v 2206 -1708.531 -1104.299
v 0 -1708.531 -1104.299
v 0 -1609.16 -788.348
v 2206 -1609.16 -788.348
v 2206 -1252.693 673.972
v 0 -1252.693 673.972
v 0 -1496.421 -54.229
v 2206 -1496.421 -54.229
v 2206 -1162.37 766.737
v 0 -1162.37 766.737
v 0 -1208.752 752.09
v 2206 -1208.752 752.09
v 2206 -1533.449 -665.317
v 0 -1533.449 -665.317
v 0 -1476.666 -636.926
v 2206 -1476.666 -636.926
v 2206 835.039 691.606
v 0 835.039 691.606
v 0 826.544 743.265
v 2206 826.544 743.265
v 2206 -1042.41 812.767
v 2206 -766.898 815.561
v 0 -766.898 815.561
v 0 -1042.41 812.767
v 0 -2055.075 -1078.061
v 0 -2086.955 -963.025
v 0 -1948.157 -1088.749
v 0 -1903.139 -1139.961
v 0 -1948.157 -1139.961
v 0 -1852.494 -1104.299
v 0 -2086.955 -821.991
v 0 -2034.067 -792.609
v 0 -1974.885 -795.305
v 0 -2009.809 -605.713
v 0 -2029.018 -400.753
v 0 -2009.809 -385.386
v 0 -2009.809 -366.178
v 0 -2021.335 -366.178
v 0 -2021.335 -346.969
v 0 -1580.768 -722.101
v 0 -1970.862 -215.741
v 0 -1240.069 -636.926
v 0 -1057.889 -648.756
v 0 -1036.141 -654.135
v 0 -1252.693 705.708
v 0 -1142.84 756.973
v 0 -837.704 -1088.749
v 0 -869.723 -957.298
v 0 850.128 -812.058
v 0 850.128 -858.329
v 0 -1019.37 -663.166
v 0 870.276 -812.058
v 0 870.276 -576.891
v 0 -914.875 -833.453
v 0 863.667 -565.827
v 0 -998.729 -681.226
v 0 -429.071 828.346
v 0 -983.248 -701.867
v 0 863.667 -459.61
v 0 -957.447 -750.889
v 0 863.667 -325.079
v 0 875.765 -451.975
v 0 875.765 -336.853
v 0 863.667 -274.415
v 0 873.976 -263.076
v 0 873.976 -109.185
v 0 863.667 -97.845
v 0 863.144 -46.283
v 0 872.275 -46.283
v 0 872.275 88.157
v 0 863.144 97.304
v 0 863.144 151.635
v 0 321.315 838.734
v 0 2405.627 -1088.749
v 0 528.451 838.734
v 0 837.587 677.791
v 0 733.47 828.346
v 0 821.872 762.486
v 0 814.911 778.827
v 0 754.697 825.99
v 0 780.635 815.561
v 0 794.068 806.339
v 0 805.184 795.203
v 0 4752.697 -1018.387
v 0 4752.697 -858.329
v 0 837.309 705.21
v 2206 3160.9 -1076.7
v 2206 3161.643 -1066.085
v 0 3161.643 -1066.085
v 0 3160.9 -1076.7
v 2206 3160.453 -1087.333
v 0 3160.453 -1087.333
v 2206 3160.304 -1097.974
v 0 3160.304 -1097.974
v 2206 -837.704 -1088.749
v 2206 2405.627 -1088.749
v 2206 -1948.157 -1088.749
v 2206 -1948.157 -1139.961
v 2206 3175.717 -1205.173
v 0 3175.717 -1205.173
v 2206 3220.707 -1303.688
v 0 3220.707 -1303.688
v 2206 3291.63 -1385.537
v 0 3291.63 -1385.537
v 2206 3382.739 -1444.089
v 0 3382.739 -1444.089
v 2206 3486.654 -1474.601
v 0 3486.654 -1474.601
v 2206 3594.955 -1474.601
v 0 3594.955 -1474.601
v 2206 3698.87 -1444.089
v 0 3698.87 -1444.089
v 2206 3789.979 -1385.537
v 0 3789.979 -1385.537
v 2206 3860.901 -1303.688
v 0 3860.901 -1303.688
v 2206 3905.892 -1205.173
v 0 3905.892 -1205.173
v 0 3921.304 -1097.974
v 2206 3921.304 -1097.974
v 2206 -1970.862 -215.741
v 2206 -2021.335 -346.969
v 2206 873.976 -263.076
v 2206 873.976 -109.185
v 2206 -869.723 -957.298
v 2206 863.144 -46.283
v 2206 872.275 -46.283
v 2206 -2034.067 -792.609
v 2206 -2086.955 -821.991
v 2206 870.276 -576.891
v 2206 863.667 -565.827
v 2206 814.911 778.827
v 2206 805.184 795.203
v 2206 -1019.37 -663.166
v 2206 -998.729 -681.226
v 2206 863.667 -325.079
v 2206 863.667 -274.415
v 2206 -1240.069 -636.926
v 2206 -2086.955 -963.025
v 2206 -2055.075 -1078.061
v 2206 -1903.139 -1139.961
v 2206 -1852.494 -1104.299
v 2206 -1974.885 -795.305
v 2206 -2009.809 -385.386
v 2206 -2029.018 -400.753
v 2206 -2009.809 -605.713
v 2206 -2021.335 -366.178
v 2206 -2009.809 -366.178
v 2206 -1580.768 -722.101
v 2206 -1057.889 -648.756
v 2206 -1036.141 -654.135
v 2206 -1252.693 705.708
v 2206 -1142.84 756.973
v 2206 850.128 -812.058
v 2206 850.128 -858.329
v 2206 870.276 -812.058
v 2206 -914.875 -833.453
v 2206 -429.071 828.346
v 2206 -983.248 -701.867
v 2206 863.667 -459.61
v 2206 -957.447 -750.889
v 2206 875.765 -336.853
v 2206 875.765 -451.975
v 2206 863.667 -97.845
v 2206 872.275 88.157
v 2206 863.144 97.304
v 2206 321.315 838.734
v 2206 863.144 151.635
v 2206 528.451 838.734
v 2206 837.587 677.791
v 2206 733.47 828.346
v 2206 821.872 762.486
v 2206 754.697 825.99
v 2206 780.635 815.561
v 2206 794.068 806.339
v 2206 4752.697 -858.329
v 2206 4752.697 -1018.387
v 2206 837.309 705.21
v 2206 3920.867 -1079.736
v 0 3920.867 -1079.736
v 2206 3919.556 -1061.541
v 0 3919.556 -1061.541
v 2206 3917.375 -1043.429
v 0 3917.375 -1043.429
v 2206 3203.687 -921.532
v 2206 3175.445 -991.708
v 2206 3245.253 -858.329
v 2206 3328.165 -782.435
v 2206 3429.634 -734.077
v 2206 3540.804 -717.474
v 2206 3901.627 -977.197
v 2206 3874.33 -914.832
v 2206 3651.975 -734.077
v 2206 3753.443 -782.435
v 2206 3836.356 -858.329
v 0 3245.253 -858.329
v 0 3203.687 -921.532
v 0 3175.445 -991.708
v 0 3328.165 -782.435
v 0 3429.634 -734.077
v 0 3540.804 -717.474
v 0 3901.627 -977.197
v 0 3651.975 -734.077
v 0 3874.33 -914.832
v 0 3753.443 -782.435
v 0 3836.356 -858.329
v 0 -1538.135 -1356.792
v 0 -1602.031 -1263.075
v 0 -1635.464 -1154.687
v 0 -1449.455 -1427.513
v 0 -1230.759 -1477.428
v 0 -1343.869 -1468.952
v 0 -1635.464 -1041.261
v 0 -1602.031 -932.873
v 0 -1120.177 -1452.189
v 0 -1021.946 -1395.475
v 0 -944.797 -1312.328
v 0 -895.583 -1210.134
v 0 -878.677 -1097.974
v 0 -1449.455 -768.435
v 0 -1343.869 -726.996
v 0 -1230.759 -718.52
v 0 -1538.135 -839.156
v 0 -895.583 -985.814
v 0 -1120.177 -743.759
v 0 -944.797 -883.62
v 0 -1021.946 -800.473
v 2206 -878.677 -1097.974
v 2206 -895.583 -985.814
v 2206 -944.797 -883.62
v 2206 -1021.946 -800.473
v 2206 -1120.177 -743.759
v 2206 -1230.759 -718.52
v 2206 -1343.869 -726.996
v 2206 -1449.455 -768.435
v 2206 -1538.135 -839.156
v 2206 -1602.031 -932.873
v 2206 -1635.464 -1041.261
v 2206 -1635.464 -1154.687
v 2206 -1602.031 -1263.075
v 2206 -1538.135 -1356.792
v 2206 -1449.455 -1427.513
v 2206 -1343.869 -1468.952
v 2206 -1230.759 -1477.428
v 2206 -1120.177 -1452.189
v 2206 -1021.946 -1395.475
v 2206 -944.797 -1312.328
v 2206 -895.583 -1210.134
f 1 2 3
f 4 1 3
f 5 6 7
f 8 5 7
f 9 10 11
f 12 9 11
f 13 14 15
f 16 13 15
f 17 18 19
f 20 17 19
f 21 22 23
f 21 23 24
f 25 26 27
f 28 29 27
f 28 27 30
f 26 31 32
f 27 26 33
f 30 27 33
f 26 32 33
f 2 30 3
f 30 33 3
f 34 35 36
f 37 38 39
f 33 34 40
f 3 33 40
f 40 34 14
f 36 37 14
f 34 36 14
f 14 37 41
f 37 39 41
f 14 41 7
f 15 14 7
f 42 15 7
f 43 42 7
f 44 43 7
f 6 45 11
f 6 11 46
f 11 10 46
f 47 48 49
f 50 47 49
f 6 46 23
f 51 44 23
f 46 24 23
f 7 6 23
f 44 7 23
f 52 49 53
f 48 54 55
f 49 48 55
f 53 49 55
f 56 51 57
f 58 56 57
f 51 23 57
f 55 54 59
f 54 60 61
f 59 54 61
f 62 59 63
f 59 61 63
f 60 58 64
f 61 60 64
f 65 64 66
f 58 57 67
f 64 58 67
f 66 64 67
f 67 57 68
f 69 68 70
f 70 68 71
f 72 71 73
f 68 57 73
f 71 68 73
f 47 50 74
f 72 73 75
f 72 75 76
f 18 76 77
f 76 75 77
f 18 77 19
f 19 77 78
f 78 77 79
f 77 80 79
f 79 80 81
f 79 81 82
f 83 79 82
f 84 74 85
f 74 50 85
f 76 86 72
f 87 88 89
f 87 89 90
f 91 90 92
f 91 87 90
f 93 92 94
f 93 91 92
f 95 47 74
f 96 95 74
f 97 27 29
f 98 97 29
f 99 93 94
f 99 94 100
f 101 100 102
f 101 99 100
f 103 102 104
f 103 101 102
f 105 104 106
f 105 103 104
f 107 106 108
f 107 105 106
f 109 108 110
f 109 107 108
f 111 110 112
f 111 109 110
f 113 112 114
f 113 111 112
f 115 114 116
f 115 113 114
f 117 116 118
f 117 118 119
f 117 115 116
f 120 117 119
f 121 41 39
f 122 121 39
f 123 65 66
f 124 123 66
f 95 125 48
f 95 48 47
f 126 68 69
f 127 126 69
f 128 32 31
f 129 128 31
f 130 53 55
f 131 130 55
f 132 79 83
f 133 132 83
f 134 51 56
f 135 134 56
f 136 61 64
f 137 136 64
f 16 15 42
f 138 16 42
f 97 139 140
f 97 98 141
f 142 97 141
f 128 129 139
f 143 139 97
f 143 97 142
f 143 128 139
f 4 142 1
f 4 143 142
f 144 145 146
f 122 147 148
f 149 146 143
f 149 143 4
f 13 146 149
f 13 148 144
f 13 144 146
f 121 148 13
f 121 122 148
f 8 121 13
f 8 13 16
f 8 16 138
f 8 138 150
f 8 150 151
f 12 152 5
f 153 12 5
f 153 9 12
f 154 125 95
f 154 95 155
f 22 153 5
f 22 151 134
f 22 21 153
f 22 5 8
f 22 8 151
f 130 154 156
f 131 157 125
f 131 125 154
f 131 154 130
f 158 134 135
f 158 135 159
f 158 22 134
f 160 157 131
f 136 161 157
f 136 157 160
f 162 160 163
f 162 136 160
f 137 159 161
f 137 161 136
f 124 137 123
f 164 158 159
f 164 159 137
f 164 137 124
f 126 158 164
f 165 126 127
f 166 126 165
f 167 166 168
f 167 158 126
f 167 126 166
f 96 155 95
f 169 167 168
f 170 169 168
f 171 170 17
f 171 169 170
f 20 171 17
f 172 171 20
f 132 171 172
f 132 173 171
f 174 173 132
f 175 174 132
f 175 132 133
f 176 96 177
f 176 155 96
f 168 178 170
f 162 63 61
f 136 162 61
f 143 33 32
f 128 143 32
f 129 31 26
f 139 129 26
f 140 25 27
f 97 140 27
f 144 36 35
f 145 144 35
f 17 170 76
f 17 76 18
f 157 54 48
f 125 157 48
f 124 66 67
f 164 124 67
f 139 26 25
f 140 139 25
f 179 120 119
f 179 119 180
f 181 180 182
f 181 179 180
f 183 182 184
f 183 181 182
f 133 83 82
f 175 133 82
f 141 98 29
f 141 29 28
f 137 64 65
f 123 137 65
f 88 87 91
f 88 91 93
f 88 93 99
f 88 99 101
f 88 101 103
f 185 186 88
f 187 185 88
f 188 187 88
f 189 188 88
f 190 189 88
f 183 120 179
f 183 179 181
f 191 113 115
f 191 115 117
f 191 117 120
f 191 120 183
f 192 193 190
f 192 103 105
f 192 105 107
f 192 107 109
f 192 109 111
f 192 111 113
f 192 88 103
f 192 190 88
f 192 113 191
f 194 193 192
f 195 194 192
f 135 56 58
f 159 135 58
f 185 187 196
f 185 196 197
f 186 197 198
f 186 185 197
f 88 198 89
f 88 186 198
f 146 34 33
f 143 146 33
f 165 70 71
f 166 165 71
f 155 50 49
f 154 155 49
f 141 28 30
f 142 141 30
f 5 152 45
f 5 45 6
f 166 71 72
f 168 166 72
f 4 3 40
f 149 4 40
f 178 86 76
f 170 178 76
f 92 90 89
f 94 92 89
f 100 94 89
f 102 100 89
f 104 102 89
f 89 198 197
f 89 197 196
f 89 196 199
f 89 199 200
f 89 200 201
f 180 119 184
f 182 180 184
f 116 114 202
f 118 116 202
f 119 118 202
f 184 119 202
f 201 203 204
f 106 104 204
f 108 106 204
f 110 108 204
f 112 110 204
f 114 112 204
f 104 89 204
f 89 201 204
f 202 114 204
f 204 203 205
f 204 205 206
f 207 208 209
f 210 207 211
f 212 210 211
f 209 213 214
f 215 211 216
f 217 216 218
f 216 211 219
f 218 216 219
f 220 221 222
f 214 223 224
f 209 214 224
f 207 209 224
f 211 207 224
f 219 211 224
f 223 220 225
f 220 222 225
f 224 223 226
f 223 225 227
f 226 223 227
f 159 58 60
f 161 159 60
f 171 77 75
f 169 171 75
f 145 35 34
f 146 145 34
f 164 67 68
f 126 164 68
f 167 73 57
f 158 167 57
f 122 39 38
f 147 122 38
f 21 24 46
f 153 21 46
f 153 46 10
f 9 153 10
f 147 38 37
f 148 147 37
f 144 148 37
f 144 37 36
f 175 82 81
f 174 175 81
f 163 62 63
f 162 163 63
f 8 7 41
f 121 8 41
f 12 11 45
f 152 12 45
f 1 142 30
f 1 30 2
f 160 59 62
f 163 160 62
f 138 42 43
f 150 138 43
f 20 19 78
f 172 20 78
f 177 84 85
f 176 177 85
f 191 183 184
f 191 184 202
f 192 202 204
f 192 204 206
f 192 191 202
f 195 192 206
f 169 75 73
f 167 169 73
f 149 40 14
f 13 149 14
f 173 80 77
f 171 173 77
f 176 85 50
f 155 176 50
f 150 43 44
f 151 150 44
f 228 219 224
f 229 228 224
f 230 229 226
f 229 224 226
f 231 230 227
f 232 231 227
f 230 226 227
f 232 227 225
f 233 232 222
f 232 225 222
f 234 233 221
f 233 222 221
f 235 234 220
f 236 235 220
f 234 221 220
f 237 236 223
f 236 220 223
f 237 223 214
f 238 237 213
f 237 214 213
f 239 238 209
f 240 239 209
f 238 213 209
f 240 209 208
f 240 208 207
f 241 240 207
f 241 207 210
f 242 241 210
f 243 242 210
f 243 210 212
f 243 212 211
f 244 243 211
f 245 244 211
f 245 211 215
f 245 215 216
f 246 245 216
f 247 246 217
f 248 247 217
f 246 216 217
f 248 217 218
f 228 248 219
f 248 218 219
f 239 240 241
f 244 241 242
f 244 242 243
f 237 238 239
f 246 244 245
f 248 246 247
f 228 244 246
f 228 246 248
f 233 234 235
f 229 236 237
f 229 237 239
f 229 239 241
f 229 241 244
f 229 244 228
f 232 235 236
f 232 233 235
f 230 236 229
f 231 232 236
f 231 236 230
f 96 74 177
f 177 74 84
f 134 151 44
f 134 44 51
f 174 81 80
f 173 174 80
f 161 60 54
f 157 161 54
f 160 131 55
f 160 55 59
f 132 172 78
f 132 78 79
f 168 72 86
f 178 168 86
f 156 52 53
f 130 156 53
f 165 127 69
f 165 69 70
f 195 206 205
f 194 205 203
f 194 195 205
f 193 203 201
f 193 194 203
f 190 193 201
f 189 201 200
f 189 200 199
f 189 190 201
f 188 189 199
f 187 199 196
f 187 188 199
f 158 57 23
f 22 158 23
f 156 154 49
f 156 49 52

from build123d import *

# Parameters (mm, degrees)
F1_DEPTH = 2206
F0_R     = 380.518397
F2_DEPTH = 2206
F4_DEPTH = 2206


with BuildPart() as f1:
    # F0 (on Right) → F1 (new body)
    with BuildSketch(Plane.YZ):
        Polygon((-2009.809494, -605.712593), (-1974.88451, -795.305073), (-2034.067154, -792.608976), (-2086.954594, -821.990967), (-2086.954594, -963.024616), (-2055.07493, -1078.061223), (-1948.156953, -1088.748813), (-1948.156953, -1139.961123), (-1903.138876, -1139.961123), (-1852.493525, -1104.298949), (-1708.531022, -1104.298949), (-1609.160185, -788.3479), (-1580.768466, -722.100675), (-1533.449054, -665.317357), (-1476.665854, -636.925697), (-1419.882536, -636.925697), (-1240.068555, -636.925697), (-1057.888746, -648.75555), (-1036.14068, -654.135108), (-1019.36996, -663.16551), (-998.72905, -681.226313), (-983.248353, -701.867163), (-957.44729, -750.889242), (-914.875448, -833.452821), (-869.723499, -957.2981), (-837.703872, -1088.748813), (2405.626749, -1088.748813), (4752.697468, -1018.38696), (4752.697468, -858.329475), (850.127637, -858.329475), (850.127637, -812.057912), (870.276332, -812.057912), (870.276332, -576.891184), (863.666773, -565.826952), (863.666773, -459.609509), (875.765383, -451.974571), (875.765383, -336.853117), (863.666773, -325.079352), (863.666773, -274.415493), (873.975813, -263.076127), (873.975813, -109.184742), (863.666773, -97.845316), (863.143861, -46.283007), (872.274971, -46.283007), (872.274971, 88.157274), (863.143861, 97.304344), (863.143861, 136.111572), (863.143861, 151.634693), (837.309351, 705.209817), (837.587416, 677.79088), (835.03896, 691.606283), (826.544046, 743.264735), (821.871877, 762.486398), (814.911127, 778.826952), (805.184186, 795.202971), (794.06774, 806.338847), (780.635357, 815.560997), (754.696906, 825.99014), (733.469546, 828.346193), (528.450668, 838.733733), (321.314812, 838.733733), (-429.070771, 828.346193), (-766.898036, 815.560997), (-1042.410256, 812.76693), (-1142.840266, 756.972611), (-1162.369728, 766.737342), (-1208.752155, 752.090216), (-1252.693415, 705.707729), (-1252.693415, 673.972368), (-1496.420741, -54.229099), (-1970.862031, -215.741038), (-2021.334648, -346.969426), (-2021.334648, -366.177976), (-2009.809494, -366.177976), (-2009.809494, -385.386497), (-2029.017925, -400.753319), align=None)
    extrude(amount=F1_DEPTH)

    # F0 (on Right) → F2 (join)
    with BuildSketch(Plane.YZ):
        Polygon((-2009.809494, -605.712593), (-1974.88451, -795.305073), (-2034.067154, -792.608976), (-2086.954594, -821.990967), (-2086.954594, -963.024616), (-2055.07493, -1078.061223), (-1948.156953, -1088.748813), (-1948.156953, -1139.961123), (-1903.138876, -1139.961123), (-1852.493525, -1104.298949), (-1708.531022, -1104.298949), (-1609.160185, -788.3479), (-1580.768466, -722.100675), (-1533.449054, -665.317357), (-1476.665854, -636.925697), (-1419.882536, -636.925697), (-1240.068555, -636.925697), (-1057.888746, -648.75555), (-1036.14068, -654.135108), (-1019.36996, -663.16551), (-998.72905, -681.226313), (-983.248353, -701.867163), (-957.44729, -750.889242), (-914.875448, -833.452821), (-869.723499, -957.2981), (-837.703872, -1088.748813), (2405.626749, -1088.748813), (4752.697468, -1018.38696), (4752.697468, -858.329475), (850.127637, -858.329475), (850.127637, -812.057912), (870.276332, -812.057912), (870.276332, -576.891184), (863.666773, -565.826952), (863.666773, -459.609509), (875.765383, -451.974571), (875.765383, -336.853117), (863.666773, -325.079352), (863.666773, -274.415493), (873.975813, -263.076127), (873.975813, -109.184742), (863.666773, -97.845316), (863.143861, -46.283007), (872.274971, -46.283007), (872.274971, 88.157274), (863.143861, 97.304344), (863.143861, 136.111572), (863.143861, 151.634693), (837.309351, 705.209817), (837.587416, 677.79088), (835.03896, 691.606283), (826.544046, 743.264735), (821.871877, 762.486398), (814.911127, 778.826952), (805.184186, 795.202971), (794.06774, 806.338847), (780.635357, 815.560997), (754.696906, 825.99014), (733.469546, 828.346193), (528.450668, 838.733733), (321.314812, 838.733733), (-429.070771, 828.346193), (-766.898036, 815.560997), (-1042.410256, 812.76693), (-1142.840266, 756.972611), (-1162.369728, 766.737342), (-1208.752155, 752.090216), (-1252.693415, 705.707729), (-1252.693415, 673.972368), (-1496.420741, -54.229099), (-1970.862031, -215.741038), (-2021.334648, -346.969426), (-2021.334648, -366.177976), (-2009.809494, -366.177976), (-2009.809494, -385.386497), (-2029.017925, -400.753319), align=None)
        with Locations((-1259.195566, -1097.974062)):
            Circle(F0_R)
    extrude(amount=F2_DEPTH)


with BuildPart() as f4:
    # F3 (on face) → F4 (new body)
    with BuildSketch(Plane.YZ.offset(2206)):
        with BuildLine():
            Line((3161.643114, -1066.084514), (3917.37456, -1043.428757))
            ThreePointArc((3917.37456, -1043.428757), (3889.376269, -945.403012), (3836.355989, -858.329475))
            Line((3836.355989, -858.329475), (3245.252878, -858.329475))
            ThreePointArc((3245.252878, -858.329475), (3187.817316, -955.916521), (3161.643114, -1066.084514))
        make_face()
        with BuildLine():
            Line((3245.252878, -858.329475), (3836.355989, -858.329475))
            ThreePointArc((3836.355989, -858.329475), (3540.804434, -717.474062), (3245.252878, -858.329475))
        make_face()
        with BuildLine():
            ThreePointArc((3160.304434, -1097.974062), (3540.804434, -1478.474062), (3921.304434, -1097.974062))
            ThreePointArc((3921.304434, -1097.974062), (3920.320694, -1070.630716), (3917.37456, -1043.428757))
            Line((3917.37456, -1043.428757), (3161.643114, -1066.084514))
            ThreePointArc((3161.643114, -1066.084514), (3160.639251, -1082.015245), (3160.304434, -1097.974062))
        make_face()
    extrude(amount=-F4_DEPTH)


solid = Compound([f1.part, f4.part])
